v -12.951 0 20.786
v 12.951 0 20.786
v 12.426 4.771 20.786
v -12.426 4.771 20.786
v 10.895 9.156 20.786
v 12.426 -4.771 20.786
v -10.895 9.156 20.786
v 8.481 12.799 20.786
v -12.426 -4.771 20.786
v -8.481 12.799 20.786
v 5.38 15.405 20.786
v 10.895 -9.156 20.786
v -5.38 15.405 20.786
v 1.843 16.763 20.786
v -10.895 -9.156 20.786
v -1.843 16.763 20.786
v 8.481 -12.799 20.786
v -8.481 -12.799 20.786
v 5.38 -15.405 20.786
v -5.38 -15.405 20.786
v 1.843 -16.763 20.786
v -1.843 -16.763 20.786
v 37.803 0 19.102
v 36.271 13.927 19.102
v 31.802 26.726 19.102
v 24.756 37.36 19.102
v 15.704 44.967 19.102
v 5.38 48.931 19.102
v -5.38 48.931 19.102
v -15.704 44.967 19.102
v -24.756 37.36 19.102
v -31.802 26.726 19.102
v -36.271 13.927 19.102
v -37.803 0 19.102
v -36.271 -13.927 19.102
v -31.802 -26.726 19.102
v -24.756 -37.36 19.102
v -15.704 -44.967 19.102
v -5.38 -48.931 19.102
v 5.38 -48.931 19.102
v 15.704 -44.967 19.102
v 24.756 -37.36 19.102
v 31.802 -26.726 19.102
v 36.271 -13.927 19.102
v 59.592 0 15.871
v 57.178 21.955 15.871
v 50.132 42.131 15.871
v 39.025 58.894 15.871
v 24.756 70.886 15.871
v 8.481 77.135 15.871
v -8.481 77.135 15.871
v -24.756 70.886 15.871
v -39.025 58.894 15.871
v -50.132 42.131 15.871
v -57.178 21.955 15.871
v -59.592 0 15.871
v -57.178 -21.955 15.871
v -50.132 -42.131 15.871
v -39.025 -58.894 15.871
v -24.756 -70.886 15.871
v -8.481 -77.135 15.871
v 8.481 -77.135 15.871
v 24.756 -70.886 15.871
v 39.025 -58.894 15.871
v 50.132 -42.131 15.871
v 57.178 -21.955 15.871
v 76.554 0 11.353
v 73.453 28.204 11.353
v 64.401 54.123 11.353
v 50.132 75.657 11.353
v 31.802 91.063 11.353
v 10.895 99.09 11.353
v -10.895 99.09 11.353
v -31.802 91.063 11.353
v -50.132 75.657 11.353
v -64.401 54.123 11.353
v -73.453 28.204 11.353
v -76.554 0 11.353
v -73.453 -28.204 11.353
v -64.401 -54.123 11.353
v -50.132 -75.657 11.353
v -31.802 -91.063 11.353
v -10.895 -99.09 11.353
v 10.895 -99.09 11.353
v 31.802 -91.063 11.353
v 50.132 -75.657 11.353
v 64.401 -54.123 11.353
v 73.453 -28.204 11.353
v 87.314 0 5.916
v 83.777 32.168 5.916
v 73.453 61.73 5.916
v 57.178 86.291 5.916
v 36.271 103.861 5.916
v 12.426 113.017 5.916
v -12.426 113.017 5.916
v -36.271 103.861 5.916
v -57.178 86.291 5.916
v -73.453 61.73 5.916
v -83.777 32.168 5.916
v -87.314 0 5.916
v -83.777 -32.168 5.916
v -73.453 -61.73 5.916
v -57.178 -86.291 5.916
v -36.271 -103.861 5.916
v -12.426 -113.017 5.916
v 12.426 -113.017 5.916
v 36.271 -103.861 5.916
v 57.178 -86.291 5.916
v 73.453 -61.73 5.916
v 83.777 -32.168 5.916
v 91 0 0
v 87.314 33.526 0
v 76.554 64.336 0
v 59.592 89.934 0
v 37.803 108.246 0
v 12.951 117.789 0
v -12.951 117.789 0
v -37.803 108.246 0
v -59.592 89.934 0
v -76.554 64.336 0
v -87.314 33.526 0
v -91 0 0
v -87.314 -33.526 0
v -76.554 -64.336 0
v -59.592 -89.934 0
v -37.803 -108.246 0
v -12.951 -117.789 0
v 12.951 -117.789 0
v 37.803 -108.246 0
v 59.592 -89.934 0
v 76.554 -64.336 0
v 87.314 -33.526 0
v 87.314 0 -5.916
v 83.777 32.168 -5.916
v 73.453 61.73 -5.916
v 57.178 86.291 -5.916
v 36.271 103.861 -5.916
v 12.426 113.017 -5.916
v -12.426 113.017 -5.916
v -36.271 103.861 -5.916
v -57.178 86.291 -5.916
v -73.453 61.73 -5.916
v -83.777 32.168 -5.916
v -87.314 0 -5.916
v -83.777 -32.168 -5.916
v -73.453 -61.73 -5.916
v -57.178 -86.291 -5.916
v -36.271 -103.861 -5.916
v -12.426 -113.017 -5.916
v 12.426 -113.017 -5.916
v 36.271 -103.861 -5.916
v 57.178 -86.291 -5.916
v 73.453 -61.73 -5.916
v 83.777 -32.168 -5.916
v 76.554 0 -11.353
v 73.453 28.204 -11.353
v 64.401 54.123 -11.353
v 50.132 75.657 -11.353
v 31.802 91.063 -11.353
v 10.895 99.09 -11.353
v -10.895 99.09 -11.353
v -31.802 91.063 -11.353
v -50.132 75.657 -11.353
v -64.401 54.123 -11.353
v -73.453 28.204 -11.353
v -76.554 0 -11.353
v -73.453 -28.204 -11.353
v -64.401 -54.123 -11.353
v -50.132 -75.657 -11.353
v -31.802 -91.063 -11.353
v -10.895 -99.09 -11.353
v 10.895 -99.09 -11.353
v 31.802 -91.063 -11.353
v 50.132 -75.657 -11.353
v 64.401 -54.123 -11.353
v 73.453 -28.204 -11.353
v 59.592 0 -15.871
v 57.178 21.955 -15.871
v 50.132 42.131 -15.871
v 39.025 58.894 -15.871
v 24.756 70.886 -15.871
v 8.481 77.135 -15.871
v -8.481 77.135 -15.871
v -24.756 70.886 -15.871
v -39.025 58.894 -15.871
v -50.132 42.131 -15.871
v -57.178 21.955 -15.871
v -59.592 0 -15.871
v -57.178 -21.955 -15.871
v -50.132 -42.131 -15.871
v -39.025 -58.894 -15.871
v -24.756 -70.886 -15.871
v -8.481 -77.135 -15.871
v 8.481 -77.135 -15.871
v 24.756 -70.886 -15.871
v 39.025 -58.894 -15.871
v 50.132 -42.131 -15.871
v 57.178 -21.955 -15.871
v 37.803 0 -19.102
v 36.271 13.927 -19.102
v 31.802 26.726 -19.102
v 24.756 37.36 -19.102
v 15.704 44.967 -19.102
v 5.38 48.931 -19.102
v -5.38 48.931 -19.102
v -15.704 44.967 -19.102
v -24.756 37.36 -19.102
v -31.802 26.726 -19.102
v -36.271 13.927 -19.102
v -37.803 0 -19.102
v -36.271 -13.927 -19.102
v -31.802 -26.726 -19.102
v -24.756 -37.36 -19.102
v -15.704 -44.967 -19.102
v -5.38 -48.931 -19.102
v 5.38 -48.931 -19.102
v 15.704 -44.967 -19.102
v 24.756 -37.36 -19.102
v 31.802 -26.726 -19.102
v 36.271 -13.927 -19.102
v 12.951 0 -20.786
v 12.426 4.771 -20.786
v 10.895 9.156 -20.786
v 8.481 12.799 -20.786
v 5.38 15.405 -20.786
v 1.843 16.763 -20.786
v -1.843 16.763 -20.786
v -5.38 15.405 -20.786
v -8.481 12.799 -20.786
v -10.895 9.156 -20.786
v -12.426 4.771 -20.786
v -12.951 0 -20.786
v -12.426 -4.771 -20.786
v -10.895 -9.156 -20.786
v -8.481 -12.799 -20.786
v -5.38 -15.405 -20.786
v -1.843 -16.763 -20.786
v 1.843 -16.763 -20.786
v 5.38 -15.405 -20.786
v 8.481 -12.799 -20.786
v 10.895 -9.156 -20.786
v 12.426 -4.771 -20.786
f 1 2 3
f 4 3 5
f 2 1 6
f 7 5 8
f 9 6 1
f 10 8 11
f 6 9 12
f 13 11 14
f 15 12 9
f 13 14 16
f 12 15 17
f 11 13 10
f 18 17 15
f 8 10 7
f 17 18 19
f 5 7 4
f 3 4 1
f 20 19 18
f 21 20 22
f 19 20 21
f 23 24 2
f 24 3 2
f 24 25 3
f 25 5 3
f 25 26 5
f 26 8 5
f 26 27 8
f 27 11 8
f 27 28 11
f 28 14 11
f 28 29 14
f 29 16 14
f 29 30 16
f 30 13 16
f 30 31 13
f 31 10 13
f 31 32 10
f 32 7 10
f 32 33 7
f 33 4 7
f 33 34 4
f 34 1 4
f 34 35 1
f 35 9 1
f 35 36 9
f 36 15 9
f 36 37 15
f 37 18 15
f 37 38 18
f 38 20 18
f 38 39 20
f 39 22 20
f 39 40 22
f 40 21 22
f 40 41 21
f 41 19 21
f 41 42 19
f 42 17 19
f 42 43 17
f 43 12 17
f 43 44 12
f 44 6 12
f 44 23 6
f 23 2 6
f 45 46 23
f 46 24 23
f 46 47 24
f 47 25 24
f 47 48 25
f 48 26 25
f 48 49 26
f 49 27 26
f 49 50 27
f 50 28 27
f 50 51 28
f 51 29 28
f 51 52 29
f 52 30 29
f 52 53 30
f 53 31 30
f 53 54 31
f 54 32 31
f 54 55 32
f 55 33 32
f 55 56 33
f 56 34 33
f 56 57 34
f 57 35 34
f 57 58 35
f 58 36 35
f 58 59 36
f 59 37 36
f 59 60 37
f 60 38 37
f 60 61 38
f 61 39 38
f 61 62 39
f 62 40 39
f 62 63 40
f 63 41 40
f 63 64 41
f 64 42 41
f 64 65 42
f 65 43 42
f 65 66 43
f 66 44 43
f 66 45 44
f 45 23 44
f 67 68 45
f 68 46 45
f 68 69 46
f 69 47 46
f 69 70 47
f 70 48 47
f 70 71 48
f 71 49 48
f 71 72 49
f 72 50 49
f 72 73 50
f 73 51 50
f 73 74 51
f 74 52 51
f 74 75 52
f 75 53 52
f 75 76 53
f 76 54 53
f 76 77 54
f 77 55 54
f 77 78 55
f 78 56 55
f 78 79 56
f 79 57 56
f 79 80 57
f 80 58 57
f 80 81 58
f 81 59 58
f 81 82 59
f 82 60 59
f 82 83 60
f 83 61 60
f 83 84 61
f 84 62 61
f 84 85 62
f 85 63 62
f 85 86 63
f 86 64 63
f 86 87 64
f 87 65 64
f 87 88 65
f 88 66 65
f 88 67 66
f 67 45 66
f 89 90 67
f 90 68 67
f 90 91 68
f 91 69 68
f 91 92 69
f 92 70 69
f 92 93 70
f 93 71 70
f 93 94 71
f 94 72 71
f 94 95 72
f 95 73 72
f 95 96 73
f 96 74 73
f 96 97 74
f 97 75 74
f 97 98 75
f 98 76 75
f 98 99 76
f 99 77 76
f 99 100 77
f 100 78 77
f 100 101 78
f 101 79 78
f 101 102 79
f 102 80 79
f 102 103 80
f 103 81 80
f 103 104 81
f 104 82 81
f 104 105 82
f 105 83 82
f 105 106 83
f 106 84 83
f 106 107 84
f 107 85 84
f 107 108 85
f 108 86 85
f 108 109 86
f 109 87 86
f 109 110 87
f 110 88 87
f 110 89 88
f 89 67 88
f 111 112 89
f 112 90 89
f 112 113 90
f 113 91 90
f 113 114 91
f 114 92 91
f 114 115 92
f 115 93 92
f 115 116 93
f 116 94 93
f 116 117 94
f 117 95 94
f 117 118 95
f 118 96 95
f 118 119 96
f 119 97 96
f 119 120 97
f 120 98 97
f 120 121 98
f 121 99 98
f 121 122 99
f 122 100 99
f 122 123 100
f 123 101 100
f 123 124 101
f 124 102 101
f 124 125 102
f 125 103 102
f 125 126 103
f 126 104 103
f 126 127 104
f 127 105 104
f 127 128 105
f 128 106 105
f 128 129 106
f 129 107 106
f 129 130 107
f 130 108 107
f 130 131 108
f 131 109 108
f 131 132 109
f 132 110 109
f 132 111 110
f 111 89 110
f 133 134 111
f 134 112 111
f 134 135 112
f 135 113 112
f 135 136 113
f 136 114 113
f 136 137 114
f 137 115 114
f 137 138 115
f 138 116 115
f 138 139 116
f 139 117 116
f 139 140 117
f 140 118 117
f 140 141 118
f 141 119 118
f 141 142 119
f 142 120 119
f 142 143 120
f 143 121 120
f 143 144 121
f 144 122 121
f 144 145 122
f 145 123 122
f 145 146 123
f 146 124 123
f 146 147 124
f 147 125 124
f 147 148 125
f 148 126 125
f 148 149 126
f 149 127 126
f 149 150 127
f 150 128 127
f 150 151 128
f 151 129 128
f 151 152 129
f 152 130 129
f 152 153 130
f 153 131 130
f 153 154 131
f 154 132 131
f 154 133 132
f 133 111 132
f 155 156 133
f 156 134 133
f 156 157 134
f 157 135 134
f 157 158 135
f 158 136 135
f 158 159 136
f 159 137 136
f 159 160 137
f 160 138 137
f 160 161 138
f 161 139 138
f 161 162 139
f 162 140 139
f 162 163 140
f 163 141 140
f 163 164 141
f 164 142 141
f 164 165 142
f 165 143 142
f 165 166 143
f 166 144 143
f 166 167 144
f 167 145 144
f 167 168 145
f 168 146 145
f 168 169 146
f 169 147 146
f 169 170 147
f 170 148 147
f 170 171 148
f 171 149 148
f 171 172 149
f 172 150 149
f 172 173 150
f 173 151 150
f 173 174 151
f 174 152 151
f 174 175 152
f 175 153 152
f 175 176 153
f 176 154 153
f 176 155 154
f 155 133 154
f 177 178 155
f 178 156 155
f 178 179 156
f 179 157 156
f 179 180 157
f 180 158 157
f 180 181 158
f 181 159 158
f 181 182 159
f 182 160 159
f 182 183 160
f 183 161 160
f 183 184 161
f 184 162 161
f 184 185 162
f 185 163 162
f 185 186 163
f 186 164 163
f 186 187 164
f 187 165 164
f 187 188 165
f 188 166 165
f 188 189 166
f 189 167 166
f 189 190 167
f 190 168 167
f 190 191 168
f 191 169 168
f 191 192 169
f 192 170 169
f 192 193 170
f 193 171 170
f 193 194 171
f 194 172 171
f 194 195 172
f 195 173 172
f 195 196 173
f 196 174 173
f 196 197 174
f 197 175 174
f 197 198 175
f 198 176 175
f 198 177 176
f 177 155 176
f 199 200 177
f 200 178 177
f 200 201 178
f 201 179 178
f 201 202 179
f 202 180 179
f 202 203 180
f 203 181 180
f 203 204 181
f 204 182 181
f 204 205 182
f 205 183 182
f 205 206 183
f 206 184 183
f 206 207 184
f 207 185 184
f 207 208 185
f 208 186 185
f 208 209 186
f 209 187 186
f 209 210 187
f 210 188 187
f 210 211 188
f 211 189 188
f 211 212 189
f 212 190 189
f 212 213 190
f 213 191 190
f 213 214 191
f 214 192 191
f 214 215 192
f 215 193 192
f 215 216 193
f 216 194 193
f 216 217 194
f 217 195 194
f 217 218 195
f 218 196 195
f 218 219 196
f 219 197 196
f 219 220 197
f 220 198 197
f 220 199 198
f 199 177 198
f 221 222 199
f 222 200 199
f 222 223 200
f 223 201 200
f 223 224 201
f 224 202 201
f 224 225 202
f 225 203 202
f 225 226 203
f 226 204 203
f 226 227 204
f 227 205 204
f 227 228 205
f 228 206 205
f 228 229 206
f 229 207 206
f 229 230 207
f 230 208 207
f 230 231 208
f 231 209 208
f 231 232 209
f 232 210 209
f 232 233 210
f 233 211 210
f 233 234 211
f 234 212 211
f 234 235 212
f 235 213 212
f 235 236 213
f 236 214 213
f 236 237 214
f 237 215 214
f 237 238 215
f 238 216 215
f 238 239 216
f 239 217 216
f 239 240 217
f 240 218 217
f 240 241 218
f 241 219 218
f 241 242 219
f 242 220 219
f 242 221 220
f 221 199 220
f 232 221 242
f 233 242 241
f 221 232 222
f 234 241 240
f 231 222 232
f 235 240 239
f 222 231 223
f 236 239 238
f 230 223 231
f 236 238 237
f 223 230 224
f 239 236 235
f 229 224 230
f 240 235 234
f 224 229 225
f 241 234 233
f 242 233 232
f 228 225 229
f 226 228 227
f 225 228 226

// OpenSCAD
// Generated by SolidPython 1.0.1 on 2020-07-29 00:46:51


scale(v = [13, 17, 3]) {
	sphere(r = 7);
}
/***********************************************
*********      SolidPython code:      **********
************************************************
 
# import packages: SolidPython
from solid import *
from solid.utils import *
from itertools import chain, combinations, permutations


class Resize:

    def __init__(self, scad_file):
        self.scad_file = scad_file
        #self.scad_file = import_scad(scad_file)
        # cone/cylinder param:
        self.r1 = 0
        self.r2 = 0
        self.h = 0
        # rectangular prism param:
        self.w = 0
        self.l = 0
        # ellipse param:
        self.r = 0

    # import OpenScad code (file name corresponds to shape)


    # classify shape + parameters
    def assign(self, param1, param2, param3):
        if self.scad_file == 'cone.scad':
            self.r1 = param1
            self.r2 = param2
            self.h = param3
        elif self.scad_file == 'cylinder.scad':
            self.r1 = param1
            self.r2 = param2
            self.h = param3
        elif self.scad_file == 'rectangularPrism.scad':
            self.h = param1
            self.l = param2
            self.w = param3
        else:
            self.r = param1
            self.h = param2

    # resize parameters
    def iterate(self):
        x = range(3, 20, 2)
        i = 1
        if self.scad_file == 'cone.scad':
            tempList = list(permutations(x, 2))
            for temp in tempList:
                param1 = temp[0]
                param2 = temp[1]
                filepath = 'produced_scad_files/' + 'cone' + str(param1) + '_' + str(param2) + '_' + '.scad'
                scad_render_to_file(cylinder(h=param1, r1=param2, r2=0), filepath)

        elif self.scad_file == 'cylinder.scad':
            tempList = list(permutations(x, 3))
            for temp in tempList:
                param1 = temp[0]
                param2 = temp[1]
                filepath = 'produced_scad_files/' + 'cylinder' + str(param1) + '_' + str(param2) + '_' + '.scad'
                scad_render_to_file(cylinder(h=param1, r1=param2, r2=param2), filepath)

        elif self.scad_file == 'rectangularPrism.scad':
            tempList = list(permutations(x, 3))
            for temp in tempList:
                param1 = temp[0]
                param2 = temp[1]
                param3 = temp[2]
                filepath = 'produced_scad_files/' + 'rectangularPrism' + str(param1) + '_' + str(param2) + '_' + str(
                    param3) + '.scad'
                scad_render_to_file(cube(size=(param1, param2, param3)), filepath)

        elif self.scad_file == 'ellipse.scad':
            tempList = list(permutations(x, 4))
            for temp in tempList:
                param1 = temp[0]
                param2 = temp[1]
                param3 = temp[2]
                param4 = temp[3]
                filepath = 'produced_scad_files/' + 'ellipse' + str(param1) + '_' + str(param2) + '_' + str(param3) + '_' + str(param4) + '.scad'
                scad_render_to_file(scale([param1, param2, param3])(sphere(r=param4)), filepath)

    def render_to_scadfile(self):
        scad_render_to_file(scad, 'example.scad') 
 
************************************************/
